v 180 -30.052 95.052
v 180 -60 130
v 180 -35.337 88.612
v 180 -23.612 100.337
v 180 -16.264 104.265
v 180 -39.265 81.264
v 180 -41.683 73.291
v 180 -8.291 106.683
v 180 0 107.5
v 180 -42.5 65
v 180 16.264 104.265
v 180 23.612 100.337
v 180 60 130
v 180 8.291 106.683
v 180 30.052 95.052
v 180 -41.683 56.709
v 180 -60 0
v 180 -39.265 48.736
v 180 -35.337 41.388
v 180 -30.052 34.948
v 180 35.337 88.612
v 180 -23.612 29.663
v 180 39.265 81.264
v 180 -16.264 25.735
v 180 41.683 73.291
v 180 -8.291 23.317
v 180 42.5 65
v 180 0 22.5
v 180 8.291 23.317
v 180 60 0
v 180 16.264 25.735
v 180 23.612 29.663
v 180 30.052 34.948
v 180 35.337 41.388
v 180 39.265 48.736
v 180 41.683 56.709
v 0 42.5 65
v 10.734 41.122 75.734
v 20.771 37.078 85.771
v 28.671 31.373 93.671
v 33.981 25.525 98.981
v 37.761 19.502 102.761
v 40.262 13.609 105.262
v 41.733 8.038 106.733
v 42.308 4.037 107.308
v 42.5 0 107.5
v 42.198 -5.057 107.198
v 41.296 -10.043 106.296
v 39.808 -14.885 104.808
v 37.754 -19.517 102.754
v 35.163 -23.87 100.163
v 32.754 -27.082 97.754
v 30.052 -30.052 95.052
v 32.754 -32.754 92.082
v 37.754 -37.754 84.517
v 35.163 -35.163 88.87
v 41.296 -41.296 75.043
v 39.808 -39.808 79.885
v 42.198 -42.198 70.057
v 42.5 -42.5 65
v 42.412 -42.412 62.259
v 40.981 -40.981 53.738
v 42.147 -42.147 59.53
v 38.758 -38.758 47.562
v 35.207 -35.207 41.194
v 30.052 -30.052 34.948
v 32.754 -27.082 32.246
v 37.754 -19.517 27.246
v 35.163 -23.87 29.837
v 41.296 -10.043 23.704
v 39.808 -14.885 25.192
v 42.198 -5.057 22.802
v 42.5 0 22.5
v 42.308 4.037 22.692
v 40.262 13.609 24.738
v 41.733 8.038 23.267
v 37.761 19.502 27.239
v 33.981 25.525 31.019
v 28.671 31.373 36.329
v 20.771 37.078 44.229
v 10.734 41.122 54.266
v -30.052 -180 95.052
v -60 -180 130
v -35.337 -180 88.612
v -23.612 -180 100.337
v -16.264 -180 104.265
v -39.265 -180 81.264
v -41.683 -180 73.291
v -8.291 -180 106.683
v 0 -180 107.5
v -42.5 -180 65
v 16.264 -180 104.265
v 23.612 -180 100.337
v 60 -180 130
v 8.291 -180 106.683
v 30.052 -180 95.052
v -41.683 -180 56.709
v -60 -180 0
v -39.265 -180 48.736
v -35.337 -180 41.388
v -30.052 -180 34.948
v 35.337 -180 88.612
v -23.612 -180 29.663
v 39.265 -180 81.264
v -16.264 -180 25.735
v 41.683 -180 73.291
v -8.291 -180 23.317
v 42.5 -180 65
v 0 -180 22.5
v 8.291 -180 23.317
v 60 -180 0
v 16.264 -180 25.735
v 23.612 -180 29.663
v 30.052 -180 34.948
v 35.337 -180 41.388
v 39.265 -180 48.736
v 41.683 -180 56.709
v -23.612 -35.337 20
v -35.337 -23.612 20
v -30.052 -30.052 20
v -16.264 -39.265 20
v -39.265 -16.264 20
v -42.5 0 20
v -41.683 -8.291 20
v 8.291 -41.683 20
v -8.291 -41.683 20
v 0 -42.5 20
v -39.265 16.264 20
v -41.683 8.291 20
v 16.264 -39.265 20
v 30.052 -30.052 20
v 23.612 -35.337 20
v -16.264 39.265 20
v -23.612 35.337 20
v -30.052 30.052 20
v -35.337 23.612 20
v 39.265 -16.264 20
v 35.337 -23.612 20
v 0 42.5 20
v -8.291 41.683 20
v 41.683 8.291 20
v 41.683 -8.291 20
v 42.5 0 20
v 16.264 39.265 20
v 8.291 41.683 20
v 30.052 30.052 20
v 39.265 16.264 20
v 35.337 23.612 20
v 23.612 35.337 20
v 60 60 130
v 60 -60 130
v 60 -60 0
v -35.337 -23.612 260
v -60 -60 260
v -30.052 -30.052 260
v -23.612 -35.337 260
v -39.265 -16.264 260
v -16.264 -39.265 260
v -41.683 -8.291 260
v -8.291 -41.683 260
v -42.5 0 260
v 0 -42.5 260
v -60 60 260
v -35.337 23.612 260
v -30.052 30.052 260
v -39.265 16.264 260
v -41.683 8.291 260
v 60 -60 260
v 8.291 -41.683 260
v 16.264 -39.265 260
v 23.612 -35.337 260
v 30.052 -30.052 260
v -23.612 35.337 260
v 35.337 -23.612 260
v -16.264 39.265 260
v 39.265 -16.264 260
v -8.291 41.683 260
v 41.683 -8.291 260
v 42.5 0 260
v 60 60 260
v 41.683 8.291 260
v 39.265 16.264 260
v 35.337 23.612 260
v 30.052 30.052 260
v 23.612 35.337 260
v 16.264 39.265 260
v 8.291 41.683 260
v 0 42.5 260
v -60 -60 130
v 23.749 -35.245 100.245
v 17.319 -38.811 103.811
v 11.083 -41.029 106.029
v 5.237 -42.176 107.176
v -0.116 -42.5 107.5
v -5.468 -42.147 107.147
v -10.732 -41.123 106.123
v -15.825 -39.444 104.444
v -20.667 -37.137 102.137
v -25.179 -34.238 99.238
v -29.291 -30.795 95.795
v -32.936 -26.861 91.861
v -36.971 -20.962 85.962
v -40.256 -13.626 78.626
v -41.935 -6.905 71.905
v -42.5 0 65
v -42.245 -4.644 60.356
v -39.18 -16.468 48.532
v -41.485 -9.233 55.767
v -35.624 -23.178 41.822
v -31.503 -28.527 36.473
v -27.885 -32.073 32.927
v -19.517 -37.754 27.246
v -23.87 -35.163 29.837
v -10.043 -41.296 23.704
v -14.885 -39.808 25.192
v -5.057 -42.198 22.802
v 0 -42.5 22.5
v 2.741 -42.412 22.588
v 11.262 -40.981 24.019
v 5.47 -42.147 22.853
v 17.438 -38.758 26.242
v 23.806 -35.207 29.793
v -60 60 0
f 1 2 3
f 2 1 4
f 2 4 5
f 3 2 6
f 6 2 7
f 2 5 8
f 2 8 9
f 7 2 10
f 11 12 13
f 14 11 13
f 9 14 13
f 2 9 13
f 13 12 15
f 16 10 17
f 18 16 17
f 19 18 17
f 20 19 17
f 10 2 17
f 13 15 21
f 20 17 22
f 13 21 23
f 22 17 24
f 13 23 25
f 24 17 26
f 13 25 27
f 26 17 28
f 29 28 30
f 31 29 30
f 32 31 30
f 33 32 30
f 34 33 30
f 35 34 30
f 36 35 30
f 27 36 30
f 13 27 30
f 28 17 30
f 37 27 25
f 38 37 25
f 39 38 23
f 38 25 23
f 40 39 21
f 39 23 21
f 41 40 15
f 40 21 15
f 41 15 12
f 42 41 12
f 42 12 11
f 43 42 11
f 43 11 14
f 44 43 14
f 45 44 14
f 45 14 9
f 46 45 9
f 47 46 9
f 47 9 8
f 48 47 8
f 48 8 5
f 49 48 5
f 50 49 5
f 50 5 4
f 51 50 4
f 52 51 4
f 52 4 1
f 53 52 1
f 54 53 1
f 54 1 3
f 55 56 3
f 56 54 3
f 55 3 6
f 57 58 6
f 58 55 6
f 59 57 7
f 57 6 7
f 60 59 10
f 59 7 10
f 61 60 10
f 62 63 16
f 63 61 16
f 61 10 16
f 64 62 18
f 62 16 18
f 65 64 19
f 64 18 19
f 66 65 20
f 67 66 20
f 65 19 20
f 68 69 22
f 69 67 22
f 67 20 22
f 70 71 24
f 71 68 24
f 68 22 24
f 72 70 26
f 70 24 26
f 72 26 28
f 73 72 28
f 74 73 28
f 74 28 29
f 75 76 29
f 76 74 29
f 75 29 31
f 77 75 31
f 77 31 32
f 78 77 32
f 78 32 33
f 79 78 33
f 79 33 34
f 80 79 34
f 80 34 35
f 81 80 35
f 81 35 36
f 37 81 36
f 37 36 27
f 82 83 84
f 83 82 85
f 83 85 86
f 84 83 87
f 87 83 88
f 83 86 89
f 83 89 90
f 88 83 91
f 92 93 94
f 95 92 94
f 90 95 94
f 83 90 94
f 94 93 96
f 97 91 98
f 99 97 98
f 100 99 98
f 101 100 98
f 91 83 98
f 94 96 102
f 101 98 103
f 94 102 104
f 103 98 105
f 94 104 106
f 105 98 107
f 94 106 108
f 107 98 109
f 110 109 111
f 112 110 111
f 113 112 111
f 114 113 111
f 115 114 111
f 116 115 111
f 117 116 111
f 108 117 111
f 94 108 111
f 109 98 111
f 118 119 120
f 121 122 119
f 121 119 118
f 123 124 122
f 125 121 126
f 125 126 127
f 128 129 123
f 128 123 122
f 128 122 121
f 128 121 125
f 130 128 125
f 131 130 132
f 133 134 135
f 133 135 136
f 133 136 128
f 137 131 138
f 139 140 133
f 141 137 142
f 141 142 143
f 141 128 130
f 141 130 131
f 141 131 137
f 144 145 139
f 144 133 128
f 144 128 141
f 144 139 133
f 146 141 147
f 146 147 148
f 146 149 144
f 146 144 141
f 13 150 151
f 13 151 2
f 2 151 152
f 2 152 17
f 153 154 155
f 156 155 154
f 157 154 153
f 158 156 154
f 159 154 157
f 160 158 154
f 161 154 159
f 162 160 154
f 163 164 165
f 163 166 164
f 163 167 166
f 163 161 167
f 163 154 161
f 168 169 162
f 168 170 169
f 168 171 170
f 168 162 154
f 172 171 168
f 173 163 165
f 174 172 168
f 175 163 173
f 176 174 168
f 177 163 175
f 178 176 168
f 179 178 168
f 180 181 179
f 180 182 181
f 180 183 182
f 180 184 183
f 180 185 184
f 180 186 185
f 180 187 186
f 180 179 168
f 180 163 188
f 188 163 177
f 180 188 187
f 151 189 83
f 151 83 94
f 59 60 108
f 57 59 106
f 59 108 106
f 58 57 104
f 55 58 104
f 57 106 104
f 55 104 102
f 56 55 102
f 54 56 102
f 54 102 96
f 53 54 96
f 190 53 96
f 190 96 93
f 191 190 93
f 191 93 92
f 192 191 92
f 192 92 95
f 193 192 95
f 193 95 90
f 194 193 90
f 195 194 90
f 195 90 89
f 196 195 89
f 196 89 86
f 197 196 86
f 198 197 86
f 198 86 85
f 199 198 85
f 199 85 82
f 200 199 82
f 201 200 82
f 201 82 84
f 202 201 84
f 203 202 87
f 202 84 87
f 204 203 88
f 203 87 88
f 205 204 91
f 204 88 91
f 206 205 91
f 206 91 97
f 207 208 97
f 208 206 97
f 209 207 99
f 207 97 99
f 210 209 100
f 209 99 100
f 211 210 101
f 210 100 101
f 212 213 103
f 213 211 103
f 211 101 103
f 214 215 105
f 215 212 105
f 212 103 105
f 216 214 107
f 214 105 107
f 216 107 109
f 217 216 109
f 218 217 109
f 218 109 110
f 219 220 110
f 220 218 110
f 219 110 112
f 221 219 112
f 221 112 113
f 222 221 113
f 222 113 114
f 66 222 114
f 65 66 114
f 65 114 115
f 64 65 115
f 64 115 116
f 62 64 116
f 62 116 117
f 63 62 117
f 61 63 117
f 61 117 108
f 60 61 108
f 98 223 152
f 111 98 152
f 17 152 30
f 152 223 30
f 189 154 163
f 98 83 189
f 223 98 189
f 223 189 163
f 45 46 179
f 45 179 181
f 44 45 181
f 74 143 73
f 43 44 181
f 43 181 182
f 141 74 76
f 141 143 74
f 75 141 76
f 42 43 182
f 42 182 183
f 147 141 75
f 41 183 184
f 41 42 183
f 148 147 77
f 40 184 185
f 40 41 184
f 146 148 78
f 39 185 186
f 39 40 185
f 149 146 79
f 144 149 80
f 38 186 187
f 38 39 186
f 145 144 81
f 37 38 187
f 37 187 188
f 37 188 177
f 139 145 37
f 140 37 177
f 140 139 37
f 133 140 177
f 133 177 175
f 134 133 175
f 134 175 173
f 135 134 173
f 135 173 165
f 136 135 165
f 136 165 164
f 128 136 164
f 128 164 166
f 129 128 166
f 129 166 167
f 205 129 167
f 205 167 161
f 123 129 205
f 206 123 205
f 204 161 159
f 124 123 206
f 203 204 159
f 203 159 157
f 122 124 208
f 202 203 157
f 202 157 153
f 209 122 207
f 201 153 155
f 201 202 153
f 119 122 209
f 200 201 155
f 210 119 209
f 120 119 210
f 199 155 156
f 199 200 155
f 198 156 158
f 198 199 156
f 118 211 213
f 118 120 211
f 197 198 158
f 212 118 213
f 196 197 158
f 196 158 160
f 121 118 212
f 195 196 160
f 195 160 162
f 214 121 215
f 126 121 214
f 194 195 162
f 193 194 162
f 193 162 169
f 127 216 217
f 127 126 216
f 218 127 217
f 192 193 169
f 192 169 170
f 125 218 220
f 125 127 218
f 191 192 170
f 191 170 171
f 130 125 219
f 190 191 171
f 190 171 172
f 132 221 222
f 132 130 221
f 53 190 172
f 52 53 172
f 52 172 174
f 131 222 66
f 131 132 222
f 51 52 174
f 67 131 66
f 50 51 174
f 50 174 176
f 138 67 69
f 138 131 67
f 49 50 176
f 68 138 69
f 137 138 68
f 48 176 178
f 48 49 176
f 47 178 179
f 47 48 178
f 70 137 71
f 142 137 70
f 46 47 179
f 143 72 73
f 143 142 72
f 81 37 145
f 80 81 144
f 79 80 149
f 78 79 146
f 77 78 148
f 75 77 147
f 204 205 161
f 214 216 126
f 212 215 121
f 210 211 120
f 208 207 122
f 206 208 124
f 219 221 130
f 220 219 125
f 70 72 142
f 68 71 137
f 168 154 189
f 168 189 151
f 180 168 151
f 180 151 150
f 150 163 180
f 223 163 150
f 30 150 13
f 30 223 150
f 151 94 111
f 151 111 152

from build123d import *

# Parameters (mm, degrees)
F0_W     = 120
F0_H     = 120
F0_R     = 42.5
F1_DEPTH = 260
F2_DEPTH = 130
F3_R     = 42.5
F5_DEPTH = 180
F4_R     = 42.5
F6_DEPTH = 180
F7_DEPTH = 20


with BuildPart() as f1:
    # F0 (on Top) → F1 (new body)
    with BuildSketch(Plane.XY):
        Rectangle(F0_W, F0_H)
        Circle(F0_R, mode=Mode.SUBTRACT)
    extrude(amount=F1_DEPTH)

    # F0 (on Top) → F2 (join)
    with BuildSketch(Plane.XY):
        with Locations((120, 0)):
            Rectangle(F0_W, F0_H)
        with Locations((0, -120)):
            Rectangle(F0_W, F0_H)
    extrude(amount=F2_DEPTH)

    # F3 (on face) → F5 (cut)
    with BuildSketch(Plane.XZ.offset(180)):
        with Locations((0, 65)):
            Circle(F3_R)
    extrude(amount=-F5_DEPTH, mode=Mode.SUBTRACT)

    # F4 (on face) → F6 (cut)
    with BuildSketch(Plane.YZ.offset(180)):
        with Locations((0, 65)):
            Circle(F4_R)
    extrude(amount=-F6_DEPTH, mode=Mode.SUBTRACT)

    # F0 (on Top) → F7 (join)
    with BuildSketch(Plane.XY):
        Circle(F0_R)
    extrude(amount=F7_DEPTH)


solid = f1.part
